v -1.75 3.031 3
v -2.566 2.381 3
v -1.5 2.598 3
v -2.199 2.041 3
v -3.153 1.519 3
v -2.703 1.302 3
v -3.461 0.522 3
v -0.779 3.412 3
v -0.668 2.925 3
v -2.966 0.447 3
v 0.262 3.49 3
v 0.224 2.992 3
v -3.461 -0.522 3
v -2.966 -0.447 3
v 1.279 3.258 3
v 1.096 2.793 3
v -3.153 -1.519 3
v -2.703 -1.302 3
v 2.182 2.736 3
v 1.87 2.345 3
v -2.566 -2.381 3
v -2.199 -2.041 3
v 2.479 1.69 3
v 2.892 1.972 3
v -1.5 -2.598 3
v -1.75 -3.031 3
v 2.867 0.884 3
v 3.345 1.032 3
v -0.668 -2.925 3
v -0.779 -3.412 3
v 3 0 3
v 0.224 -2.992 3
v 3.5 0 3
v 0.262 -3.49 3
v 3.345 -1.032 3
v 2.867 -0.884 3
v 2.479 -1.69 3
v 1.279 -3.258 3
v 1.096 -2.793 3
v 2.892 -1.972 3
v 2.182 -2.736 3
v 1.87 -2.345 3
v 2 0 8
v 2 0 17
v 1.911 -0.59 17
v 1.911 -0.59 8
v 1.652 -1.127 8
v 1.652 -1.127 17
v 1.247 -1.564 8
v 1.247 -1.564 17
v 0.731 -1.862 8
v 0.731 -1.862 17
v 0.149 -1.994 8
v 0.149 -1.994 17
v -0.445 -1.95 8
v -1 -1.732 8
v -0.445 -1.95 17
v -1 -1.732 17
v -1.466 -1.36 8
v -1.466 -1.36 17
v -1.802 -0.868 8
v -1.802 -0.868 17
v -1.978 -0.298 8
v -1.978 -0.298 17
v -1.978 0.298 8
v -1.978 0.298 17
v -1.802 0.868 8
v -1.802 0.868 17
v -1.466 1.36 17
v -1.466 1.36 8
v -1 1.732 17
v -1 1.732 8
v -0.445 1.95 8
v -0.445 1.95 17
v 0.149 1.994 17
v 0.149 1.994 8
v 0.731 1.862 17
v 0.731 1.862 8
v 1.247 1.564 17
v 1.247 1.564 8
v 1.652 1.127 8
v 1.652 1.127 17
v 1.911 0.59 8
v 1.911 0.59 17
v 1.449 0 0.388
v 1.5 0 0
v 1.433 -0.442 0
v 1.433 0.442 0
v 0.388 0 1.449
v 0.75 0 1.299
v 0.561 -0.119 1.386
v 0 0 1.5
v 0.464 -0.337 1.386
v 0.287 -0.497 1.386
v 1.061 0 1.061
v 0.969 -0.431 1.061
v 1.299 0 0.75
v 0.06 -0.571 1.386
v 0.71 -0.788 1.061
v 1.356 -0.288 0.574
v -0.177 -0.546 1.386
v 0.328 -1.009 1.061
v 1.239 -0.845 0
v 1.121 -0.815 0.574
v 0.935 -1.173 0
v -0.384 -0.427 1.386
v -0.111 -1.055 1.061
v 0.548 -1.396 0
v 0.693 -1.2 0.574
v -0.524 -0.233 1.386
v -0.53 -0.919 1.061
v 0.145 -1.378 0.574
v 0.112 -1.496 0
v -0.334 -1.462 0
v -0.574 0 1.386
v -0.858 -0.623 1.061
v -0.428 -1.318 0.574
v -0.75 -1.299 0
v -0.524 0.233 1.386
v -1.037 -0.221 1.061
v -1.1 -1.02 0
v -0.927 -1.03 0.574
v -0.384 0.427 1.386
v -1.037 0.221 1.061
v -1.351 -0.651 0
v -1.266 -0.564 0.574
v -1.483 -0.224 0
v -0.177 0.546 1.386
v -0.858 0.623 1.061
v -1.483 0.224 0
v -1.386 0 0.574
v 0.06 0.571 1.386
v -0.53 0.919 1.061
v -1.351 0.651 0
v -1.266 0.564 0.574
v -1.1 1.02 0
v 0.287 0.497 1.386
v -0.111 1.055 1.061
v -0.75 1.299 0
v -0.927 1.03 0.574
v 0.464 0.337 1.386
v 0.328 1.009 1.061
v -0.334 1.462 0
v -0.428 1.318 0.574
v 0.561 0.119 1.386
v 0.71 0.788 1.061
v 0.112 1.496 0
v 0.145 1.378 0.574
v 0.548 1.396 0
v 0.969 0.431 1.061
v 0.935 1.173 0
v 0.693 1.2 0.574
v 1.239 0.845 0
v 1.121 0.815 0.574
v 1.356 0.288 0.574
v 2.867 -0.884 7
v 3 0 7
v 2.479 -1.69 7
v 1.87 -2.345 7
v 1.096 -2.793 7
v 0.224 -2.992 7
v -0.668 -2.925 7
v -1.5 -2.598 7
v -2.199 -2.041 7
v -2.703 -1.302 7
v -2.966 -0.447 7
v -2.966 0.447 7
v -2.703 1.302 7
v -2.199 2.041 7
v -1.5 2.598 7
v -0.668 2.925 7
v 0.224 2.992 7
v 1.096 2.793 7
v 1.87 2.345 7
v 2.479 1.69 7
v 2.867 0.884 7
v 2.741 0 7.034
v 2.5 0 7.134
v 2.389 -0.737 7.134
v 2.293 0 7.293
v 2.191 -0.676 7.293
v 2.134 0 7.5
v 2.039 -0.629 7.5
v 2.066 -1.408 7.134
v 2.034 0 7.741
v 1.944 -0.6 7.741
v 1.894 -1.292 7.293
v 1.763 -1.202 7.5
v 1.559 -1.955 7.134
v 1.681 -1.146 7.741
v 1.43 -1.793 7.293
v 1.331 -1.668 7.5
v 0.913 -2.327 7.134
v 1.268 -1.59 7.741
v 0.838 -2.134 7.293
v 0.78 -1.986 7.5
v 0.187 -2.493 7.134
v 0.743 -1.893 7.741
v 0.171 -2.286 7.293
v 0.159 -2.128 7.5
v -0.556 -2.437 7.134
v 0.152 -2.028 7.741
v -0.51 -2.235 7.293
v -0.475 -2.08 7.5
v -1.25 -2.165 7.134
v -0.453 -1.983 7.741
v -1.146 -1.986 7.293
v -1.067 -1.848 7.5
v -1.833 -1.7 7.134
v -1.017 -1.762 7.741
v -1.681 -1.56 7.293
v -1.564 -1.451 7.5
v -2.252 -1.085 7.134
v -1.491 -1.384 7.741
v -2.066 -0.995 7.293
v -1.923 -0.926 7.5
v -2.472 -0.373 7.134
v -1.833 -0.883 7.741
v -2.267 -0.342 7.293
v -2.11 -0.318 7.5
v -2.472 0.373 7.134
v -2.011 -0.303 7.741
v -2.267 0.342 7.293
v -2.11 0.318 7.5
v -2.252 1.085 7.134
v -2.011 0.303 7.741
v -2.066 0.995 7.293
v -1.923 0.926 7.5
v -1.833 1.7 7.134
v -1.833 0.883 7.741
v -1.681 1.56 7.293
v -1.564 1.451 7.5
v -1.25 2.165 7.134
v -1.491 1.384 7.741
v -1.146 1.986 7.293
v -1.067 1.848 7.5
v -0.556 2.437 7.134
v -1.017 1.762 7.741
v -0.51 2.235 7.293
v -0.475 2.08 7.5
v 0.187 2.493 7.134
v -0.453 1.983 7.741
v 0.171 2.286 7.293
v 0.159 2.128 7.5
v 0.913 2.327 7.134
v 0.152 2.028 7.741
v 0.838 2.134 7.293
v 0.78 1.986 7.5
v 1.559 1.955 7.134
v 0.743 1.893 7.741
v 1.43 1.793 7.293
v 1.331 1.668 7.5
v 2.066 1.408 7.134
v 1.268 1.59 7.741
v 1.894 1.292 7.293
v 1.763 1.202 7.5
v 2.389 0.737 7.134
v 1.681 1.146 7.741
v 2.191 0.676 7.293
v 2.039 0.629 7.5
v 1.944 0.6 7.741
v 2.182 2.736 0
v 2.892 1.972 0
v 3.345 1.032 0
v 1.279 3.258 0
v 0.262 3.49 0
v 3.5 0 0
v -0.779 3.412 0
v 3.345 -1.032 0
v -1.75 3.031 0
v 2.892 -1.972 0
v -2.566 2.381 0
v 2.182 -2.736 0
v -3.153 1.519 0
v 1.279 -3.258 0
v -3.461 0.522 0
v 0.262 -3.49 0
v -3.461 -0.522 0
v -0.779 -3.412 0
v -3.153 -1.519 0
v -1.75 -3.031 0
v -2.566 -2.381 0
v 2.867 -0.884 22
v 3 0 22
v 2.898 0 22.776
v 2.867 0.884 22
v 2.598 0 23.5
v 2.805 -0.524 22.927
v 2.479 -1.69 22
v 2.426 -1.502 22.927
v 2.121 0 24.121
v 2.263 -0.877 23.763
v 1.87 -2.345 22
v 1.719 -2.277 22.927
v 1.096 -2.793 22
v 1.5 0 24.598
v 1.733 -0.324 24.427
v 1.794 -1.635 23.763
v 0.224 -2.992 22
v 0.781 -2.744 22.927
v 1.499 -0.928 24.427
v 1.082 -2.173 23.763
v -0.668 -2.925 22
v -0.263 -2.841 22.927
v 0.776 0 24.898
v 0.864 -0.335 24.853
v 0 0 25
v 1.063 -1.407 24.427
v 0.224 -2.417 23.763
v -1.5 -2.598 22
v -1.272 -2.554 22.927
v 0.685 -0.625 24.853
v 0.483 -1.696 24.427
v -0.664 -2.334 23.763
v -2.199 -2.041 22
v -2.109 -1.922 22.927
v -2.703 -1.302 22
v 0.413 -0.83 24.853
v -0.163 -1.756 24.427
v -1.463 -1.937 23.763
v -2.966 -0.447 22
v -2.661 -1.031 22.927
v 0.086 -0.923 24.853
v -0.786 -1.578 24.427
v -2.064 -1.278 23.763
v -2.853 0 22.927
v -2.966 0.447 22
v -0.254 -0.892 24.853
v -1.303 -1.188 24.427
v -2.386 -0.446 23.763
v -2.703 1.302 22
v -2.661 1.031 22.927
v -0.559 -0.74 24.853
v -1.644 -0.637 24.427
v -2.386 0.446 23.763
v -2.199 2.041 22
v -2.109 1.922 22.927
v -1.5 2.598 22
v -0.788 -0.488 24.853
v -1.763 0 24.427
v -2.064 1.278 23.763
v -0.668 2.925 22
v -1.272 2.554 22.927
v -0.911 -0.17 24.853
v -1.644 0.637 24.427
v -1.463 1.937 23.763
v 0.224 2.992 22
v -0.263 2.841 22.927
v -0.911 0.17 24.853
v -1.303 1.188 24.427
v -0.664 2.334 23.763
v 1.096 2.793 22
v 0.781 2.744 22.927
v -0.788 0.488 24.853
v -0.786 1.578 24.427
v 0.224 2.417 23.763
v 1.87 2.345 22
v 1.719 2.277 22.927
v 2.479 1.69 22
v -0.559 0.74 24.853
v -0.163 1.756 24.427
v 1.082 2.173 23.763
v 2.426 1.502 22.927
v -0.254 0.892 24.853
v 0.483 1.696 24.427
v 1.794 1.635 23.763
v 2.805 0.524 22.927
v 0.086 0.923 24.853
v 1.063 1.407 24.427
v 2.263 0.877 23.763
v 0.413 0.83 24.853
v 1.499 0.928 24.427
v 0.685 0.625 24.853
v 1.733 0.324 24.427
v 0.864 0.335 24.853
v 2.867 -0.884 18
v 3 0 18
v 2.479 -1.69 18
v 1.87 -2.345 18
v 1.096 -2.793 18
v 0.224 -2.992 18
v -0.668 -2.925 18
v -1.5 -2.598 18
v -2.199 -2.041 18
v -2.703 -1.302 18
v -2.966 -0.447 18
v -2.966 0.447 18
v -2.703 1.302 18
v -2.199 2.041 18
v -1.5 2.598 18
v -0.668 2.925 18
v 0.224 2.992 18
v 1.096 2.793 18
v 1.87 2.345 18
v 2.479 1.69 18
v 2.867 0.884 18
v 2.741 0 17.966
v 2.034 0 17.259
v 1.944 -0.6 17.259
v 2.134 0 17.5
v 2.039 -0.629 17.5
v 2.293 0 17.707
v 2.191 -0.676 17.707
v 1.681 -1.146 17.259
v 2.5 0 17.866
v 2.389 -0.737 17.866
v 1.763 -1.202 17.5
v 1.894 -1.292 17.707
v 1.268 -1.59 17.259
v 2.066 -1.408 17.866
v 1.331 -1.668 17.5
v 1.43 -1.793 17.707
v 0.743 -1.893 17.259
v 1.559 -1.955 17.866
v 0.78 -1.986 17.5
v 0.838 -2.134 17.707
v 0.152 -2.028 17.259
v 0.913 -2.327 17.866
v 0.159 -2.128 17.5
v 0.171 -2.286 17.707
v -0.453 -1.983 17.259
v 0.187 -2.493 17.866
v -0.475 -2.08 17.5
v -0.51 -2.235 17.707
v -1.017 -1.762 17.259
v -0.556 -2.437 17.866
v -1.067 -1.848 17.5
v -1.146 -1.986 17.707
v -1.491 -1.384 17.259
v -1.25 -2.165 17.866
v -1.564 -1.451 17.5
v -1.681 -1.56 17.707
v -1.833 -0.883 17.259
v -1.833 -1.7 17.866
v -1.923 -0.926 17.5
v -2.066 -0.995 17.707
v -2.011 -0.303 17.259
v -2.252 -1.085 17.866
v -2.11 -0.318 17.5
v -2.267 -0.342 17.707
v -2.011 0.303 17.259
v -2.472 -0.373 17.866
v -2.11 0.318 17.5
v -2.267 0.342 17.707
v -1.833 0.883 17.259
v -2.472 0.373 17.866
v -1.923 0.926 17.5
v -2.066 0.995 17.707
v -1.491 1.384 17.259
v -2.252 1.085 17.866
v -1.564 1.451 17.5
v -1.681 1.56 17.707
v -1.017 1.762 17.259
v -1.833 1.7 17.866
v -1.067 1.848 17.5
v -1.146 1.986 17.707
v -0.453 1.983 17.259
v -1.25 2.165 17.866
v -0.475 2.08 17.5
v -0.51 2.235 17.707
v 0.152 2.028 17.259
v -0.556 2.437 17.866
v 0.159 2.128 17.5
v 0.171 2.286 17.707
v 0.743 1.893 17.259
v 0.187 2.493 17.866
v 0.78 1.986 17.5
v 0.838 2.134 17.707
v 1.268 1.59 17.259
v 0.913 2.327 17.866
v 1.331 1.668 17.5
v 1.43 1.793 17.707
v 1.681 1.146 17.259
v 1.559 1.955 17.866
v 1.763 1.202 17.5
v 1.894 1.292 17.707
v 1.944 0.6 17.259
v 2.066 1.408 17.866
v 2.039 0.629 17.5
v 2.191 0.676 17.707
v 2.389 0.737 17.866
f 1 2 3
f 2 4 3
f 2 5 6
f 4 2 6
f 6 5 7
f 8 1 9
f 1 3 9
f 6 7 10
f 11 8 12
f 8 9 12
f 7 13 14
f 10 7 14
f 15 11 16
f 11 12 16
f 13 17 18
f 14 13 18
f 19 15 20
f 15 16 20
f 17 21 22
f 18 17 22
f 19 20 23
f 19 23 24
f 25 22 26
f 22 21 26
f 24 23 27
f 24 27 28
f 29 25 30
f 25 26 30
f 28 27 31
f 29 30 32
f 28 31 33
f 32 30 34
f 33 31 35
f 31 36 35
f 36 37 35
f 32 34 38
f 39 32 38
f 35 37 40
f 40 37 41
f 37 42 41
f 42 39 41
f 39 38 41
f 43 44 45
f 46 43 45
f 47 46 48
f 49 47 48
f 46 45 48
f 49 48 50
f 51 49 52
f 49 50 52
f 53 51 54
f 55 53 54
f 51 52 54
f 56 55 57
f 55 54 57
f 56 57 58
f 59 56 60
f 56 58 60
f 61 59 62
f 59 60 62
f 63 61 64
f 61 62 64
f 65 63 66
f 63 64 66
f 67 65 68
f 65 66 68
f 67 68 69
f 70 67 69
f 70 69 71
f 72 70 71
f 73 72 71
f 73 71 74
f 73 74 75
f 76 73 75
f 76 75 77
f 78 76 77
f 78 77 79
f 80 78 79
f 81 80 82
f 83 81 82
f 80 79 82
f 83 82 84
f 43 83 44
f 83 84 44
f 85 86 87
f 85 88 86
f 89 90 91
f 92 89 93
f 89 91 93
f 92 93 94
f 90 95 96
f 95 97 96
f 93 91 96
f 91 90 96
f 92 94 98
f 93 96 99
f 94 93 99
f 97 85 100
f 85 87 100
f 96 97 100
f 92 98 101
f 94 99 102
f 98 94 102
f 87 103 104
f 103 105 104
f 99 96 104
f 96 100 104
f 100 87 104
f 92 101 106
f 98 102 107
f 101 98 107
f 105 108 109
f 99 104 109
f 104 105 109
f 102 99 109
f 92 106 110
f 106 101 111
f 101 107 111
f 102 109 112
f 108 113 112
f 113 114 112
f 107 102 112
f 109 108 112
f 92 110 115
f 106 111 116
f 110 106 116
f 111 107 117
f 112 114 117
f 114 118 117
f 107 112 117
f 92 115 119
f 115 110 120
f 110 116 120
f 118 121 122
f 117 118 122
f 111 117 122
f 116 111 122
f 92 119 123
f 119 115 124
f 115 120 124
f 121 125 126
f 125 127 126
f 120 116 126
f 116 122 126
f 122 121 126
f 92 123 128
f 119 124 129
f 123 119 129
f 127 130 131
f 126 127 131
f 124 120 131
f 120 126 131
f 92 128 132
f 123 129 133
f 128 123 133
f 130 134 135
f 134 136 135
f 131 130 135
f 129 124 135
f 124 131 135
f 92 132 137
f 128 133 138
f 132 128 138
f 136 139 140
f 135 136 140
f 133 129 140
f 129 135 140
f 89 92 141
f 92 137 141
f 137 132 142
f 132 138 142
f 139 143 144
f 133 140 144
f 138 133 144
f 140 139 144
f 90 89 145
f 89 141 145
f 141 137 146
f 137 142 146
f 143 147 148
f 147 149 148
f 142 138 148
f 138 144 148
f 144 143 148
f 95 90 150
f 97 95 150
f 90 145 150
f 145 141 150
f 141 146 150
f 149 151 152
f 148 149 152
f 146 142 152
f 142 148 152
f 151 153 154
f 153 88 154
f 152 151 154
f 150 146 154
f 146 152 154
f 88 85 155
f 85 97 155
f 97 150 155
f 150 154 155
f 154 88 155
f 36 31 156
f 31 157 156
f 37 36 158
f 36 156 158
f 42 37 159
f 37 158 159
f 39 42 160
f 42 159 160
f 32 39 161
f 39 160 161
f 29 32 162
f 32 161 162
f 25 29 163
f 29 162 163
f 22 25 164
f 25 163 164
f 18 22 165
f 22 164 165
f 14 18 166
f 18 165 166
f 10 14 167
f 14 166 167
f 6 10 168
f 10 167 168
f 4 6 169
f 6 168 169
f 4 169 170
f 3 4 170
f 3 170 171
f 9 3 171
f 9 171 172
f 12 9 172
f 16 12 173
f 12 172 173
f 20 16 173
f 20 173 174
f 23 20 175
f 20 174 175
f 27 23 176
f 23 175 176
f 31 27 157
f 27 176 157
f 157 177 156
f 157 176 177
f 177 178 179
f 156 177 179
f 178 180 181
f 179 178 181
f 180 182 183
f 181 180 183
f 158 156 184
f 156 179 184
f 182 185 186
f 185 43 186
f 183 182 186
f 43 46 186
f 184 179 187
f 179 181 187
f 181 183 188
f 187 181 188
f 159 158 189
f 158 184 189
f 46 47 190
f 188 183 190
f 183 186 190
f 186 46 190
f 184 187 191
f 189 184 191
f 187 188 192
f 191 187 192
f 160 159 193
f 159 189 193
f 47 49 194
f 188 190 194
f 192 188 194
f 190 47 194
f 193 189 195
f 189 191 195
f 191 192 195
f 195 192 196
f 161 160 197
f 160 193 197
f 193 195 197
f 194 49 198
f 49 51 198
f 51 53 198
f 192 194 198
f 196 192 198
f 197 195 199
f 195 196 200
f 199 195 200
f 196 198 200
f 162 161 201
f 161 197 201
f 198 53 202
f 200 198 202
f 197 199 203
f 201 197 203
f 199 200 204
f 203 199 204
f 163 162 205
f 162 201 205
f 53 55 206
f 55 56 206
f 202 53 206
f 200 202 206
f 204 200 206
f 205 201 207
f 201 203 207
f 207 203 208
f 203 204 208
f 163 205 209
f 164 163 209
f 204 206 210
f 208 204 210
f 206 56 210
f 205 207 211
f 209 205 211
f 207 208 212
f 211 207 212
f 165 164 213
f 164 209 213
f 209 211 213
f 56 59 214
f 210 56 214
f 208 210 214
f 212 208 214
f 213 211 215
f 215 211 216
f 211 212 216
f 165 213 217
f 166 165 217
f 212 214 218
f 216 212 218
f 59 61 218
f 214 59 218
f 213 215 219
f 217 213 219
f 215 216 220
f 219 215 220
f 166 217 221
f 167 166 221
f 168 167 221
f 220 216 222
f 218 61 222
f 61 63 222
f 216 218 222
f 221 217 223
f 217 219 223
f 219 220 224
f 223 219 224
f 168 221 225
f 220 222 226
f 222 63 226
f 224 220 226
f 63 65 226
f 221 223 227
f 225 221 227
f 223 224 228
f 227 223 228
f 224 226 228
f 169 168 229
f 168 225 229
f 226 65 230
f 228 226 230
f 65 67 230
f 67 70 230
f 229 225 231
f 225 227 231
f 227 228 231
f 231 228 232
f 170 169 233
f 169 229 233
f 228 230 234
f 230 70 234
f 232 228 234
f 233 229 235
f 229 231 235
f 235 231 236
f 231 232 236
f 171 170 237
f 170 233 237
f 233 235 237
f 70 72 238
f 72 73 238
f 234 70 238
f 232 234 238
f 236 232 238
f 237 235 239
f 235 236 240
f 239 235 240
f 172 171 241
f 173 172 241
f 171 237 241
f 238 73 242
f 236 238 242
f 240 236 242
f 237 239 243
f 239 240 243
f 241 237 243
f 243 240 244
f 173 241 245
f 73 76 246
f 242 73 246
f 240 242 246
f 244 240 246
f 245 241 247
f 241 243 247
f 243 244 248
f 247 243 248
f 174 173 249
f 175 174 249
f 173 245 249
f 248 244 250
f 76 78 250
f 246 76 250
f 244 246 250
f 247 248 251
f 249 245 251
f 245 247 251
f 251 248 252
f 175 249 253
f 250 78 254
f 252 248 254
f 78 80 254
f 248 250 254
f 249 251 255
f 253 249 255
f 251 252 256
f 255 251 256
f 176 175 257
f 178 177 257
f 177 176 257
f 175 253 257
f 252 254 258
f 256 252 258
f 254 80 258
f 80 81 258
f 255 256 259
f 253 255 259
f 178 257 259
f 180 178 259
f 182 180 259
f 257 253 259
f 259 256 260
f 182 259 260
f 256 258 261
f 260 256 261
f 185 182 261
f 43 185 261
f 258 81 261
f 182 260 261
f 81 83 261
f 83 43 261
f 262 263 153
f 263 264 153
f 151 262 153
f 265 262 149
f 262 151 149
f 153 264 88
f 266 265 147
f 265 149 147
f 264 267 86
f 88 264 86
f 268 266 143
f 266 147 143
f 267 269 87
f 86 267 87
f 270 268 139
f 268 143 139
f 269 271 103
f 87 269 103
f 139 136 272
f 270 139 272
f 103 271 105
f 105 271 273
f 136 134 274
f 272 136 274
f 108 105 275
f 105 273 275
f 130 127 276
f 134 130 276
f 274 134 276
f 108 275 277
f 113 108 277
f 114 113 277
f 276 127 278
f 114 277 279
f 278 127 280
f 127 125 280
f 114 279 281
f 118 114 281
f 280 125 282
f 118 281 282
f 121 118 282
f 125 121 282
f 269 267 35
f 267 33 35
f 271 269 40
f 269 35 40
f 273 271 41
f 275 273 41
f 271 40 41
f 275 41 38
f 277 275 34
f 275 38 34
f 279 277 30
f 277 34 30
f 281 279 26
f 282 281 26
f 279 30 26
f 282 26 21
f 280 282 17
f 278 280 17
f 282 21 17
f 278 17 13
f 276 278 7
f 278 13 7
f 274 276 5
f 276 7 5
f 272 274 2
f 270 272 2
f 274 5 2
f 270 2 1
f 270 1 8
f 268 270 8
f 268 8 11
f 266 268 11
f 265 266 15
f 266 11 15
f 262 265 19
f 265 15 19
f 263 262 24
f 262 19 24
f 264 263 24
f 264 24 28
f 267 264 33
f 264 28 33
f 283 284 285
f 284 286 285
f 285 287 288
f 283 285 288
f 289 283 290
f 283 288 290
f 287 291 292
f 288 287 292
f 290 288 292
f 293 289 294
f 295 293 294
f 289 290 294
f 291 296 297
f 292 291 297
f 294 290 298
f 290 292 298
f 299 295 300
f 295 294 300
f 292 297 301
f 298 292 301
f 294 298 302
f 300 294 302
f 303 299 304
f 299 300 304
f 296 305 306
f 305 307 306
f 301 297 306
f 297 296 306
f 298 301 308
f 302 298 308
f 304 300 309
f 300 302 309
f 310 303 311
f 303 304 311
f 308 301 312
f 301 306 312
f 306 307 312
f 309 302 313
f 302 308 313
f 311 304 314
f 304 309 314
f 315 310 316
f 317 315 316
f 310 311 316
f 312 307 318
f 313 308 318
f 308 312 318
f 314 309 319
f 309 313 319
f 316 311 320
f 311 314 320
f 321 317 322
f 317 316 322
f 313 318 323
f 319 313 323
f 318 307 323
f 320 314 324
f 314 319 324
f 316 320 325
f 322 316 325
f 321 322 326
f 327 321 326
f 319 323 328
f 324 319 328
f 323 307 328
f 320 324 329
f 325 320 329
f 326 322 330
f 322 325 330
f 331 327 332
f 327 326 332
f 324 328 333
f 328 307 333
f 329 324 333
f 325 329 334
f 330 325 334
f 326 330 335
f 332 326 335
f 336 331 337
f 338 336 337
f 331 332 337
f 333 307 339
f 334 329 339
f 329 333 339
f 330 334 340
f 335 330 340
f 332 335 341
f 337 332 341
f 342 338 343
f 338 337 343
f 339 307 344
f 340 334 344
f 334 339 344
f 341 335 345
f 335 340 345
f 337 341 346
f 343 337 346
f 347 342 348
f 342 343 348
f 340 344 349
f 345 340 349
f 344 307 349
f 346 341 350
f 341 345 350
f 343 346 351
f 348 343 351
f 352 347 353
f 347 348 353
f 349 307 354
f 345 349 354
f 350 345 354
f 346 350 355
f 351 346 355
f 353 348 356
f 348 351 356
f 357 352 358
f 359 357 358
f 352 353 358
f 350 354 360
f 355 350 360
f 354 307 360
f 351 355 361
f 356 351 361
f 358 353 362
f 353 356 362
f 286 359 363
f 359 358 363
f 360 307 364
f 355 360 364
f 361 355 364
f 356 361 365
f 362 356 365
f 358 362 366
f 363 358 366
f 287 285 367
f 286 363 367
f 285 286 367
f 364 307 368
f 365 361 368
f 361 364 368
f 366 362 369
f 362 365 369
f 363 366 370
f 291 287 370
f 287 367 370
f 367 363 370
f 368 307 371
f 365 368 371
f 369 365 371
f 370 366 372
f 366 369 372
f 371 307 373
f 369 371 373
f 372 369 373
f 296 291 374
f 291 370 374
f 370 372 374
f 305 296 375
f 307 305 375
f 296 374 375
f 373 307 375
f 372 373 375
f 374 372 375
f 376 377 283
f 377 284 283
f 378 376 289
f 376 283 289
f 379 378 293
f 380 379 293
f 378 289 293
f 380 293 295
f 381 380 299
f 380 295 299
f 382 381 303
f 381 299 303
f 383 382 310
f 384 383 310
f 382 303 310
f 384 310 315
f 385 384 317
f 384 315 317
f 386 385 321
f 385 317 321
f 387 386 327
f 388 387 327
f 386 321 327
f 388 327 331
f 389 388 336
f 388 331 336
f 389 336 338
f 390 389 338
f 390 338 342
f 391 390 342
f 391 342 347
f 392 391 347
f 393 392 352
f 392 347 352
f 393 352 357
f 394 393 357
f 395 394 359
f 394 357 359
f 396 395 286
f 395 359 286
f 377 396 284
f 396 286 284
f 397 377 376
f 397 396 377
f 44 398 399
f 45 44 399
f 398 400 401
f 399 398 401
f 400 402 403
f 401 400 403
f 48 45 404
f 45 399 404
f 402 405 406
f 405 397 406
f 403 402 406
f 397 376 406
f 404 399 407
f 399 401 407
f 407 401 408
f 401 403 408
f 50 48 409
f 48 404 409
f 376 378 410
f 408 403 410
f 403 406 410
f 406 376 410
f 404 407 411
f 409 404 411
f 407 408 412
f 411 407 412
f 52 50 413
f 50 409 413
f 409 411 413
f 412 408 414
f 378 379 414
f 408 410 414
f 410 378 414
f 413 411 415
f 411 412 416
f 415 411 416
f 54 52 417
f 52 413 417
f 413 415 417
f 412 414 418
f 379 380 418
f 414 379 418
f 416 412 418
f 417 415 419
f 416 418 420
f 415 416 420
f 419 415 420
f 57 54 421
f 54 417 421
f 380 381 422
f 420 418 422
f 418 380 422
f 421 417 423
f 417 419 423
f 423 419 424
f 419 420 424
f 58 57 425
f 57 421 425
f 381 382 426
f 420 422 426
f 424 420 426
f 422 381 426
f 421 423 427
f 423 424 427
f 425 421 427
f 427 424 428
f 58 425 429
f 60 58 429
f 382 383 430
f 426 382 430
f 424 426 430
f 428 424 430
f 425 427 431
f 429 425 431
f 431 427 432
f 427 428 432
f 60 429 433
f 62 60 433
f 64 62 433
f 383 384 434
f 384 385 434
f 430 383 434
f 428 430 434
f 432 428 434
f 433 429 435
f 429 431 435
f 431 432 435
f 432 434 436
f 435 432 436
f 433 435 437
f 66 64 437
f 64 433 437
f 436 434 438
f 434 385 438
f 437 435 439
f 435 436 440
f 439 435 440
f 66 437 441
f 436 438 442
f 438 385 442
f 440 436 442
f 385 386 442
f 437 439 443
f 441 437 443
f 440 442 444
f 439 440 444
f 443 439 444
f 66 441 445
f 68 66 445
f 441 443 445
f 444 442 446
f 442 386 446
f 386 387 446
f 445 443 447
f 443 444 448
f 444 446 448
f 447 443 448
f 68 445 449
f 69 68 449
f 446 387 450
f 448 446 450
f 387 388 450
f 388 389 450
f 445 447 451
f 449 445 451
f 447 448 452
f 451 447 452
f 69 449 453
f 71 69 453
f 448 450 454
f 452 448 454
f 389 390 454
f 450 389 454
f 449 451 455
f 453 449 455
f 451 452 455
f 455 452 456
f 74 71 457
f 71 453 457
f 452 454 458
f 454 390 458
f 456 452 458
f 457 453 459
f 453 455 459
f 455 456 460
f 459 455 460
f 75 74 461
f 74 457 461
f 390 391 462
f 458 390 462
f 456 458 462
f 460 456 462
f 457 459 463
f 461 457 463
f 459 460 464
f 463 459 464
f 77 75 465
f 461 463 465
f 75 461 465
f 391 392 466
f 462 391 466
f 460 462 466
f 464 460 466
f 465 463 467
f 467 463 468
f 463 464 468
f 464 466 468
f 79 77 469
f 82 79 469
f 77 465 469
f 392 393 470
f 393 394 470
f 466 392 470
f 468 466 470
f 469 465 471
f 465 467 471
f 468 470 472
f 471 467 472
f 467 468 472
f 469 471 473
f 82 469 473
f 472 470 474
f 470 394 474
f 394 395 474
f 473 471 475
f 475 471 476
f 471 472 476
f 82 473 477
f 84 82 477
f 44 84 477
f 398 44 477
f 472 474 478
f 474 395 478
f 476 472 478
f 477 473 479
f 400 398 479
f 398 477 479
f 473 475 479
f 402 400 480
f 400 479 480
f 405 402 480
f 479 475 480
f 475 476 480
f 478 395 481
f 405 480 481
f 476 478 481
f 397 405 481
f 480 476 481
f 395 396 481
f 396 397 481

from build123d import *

# Parameters (mm, degrees)
F2_R = 0.99999


# Not quite as in the source:
# - a fillet or chamfer is up to 0.001 mm smaller than in the source, because OpenCascade refuses the exact size


with BuildPart() as f1:
    # F0 (on Front) → F1 (revolve)
    with BuildSketch(Plane.XZ):
        with BuildLine():
            Line((0, 25), (0, 22))
            Line((0, 22), (3, 22))
            ThreePointArc((3, 22), (2.1213203436, 24.1213203436), (0, 25))
        make_face()
        with BuildLine():
            ThreePointArc((0, 1.5), (1.0606601718, 1.0606601718), (1.5, 0))
            Line((1.5, 0), (3.5, 0))
            Line((3.5, 0), (3.5, 3))
            Line((3.5, 3), (3, 3))
            Line((3, 3), (3, 7))
            Line((3, 7), (2, 7))
            Line((2, 7), (2, 18))
            Line((2, 18), (3, 18))
            Line((3, 18), (3, 22))
            Line((3, 22), (0, 22))
            Line((0, 22), (0, 3))
            Line((0, 3), (0, 1.5))
        make_face()
    revolve(axis=Axis((0, 0, 13.25), (0, 0, -1)))

    # F2 (radius 1 in the source; OpenCascade refuses exactly that, so slightly less here)
    f2_edges = [f1.edges().sort_by_distance(p)[0] for p in [
        (-2, 0, 18),
        (-2, 0, 7),
    ]]
    fillet(f2_edges, radius=F2_R)


solid = f1.part
